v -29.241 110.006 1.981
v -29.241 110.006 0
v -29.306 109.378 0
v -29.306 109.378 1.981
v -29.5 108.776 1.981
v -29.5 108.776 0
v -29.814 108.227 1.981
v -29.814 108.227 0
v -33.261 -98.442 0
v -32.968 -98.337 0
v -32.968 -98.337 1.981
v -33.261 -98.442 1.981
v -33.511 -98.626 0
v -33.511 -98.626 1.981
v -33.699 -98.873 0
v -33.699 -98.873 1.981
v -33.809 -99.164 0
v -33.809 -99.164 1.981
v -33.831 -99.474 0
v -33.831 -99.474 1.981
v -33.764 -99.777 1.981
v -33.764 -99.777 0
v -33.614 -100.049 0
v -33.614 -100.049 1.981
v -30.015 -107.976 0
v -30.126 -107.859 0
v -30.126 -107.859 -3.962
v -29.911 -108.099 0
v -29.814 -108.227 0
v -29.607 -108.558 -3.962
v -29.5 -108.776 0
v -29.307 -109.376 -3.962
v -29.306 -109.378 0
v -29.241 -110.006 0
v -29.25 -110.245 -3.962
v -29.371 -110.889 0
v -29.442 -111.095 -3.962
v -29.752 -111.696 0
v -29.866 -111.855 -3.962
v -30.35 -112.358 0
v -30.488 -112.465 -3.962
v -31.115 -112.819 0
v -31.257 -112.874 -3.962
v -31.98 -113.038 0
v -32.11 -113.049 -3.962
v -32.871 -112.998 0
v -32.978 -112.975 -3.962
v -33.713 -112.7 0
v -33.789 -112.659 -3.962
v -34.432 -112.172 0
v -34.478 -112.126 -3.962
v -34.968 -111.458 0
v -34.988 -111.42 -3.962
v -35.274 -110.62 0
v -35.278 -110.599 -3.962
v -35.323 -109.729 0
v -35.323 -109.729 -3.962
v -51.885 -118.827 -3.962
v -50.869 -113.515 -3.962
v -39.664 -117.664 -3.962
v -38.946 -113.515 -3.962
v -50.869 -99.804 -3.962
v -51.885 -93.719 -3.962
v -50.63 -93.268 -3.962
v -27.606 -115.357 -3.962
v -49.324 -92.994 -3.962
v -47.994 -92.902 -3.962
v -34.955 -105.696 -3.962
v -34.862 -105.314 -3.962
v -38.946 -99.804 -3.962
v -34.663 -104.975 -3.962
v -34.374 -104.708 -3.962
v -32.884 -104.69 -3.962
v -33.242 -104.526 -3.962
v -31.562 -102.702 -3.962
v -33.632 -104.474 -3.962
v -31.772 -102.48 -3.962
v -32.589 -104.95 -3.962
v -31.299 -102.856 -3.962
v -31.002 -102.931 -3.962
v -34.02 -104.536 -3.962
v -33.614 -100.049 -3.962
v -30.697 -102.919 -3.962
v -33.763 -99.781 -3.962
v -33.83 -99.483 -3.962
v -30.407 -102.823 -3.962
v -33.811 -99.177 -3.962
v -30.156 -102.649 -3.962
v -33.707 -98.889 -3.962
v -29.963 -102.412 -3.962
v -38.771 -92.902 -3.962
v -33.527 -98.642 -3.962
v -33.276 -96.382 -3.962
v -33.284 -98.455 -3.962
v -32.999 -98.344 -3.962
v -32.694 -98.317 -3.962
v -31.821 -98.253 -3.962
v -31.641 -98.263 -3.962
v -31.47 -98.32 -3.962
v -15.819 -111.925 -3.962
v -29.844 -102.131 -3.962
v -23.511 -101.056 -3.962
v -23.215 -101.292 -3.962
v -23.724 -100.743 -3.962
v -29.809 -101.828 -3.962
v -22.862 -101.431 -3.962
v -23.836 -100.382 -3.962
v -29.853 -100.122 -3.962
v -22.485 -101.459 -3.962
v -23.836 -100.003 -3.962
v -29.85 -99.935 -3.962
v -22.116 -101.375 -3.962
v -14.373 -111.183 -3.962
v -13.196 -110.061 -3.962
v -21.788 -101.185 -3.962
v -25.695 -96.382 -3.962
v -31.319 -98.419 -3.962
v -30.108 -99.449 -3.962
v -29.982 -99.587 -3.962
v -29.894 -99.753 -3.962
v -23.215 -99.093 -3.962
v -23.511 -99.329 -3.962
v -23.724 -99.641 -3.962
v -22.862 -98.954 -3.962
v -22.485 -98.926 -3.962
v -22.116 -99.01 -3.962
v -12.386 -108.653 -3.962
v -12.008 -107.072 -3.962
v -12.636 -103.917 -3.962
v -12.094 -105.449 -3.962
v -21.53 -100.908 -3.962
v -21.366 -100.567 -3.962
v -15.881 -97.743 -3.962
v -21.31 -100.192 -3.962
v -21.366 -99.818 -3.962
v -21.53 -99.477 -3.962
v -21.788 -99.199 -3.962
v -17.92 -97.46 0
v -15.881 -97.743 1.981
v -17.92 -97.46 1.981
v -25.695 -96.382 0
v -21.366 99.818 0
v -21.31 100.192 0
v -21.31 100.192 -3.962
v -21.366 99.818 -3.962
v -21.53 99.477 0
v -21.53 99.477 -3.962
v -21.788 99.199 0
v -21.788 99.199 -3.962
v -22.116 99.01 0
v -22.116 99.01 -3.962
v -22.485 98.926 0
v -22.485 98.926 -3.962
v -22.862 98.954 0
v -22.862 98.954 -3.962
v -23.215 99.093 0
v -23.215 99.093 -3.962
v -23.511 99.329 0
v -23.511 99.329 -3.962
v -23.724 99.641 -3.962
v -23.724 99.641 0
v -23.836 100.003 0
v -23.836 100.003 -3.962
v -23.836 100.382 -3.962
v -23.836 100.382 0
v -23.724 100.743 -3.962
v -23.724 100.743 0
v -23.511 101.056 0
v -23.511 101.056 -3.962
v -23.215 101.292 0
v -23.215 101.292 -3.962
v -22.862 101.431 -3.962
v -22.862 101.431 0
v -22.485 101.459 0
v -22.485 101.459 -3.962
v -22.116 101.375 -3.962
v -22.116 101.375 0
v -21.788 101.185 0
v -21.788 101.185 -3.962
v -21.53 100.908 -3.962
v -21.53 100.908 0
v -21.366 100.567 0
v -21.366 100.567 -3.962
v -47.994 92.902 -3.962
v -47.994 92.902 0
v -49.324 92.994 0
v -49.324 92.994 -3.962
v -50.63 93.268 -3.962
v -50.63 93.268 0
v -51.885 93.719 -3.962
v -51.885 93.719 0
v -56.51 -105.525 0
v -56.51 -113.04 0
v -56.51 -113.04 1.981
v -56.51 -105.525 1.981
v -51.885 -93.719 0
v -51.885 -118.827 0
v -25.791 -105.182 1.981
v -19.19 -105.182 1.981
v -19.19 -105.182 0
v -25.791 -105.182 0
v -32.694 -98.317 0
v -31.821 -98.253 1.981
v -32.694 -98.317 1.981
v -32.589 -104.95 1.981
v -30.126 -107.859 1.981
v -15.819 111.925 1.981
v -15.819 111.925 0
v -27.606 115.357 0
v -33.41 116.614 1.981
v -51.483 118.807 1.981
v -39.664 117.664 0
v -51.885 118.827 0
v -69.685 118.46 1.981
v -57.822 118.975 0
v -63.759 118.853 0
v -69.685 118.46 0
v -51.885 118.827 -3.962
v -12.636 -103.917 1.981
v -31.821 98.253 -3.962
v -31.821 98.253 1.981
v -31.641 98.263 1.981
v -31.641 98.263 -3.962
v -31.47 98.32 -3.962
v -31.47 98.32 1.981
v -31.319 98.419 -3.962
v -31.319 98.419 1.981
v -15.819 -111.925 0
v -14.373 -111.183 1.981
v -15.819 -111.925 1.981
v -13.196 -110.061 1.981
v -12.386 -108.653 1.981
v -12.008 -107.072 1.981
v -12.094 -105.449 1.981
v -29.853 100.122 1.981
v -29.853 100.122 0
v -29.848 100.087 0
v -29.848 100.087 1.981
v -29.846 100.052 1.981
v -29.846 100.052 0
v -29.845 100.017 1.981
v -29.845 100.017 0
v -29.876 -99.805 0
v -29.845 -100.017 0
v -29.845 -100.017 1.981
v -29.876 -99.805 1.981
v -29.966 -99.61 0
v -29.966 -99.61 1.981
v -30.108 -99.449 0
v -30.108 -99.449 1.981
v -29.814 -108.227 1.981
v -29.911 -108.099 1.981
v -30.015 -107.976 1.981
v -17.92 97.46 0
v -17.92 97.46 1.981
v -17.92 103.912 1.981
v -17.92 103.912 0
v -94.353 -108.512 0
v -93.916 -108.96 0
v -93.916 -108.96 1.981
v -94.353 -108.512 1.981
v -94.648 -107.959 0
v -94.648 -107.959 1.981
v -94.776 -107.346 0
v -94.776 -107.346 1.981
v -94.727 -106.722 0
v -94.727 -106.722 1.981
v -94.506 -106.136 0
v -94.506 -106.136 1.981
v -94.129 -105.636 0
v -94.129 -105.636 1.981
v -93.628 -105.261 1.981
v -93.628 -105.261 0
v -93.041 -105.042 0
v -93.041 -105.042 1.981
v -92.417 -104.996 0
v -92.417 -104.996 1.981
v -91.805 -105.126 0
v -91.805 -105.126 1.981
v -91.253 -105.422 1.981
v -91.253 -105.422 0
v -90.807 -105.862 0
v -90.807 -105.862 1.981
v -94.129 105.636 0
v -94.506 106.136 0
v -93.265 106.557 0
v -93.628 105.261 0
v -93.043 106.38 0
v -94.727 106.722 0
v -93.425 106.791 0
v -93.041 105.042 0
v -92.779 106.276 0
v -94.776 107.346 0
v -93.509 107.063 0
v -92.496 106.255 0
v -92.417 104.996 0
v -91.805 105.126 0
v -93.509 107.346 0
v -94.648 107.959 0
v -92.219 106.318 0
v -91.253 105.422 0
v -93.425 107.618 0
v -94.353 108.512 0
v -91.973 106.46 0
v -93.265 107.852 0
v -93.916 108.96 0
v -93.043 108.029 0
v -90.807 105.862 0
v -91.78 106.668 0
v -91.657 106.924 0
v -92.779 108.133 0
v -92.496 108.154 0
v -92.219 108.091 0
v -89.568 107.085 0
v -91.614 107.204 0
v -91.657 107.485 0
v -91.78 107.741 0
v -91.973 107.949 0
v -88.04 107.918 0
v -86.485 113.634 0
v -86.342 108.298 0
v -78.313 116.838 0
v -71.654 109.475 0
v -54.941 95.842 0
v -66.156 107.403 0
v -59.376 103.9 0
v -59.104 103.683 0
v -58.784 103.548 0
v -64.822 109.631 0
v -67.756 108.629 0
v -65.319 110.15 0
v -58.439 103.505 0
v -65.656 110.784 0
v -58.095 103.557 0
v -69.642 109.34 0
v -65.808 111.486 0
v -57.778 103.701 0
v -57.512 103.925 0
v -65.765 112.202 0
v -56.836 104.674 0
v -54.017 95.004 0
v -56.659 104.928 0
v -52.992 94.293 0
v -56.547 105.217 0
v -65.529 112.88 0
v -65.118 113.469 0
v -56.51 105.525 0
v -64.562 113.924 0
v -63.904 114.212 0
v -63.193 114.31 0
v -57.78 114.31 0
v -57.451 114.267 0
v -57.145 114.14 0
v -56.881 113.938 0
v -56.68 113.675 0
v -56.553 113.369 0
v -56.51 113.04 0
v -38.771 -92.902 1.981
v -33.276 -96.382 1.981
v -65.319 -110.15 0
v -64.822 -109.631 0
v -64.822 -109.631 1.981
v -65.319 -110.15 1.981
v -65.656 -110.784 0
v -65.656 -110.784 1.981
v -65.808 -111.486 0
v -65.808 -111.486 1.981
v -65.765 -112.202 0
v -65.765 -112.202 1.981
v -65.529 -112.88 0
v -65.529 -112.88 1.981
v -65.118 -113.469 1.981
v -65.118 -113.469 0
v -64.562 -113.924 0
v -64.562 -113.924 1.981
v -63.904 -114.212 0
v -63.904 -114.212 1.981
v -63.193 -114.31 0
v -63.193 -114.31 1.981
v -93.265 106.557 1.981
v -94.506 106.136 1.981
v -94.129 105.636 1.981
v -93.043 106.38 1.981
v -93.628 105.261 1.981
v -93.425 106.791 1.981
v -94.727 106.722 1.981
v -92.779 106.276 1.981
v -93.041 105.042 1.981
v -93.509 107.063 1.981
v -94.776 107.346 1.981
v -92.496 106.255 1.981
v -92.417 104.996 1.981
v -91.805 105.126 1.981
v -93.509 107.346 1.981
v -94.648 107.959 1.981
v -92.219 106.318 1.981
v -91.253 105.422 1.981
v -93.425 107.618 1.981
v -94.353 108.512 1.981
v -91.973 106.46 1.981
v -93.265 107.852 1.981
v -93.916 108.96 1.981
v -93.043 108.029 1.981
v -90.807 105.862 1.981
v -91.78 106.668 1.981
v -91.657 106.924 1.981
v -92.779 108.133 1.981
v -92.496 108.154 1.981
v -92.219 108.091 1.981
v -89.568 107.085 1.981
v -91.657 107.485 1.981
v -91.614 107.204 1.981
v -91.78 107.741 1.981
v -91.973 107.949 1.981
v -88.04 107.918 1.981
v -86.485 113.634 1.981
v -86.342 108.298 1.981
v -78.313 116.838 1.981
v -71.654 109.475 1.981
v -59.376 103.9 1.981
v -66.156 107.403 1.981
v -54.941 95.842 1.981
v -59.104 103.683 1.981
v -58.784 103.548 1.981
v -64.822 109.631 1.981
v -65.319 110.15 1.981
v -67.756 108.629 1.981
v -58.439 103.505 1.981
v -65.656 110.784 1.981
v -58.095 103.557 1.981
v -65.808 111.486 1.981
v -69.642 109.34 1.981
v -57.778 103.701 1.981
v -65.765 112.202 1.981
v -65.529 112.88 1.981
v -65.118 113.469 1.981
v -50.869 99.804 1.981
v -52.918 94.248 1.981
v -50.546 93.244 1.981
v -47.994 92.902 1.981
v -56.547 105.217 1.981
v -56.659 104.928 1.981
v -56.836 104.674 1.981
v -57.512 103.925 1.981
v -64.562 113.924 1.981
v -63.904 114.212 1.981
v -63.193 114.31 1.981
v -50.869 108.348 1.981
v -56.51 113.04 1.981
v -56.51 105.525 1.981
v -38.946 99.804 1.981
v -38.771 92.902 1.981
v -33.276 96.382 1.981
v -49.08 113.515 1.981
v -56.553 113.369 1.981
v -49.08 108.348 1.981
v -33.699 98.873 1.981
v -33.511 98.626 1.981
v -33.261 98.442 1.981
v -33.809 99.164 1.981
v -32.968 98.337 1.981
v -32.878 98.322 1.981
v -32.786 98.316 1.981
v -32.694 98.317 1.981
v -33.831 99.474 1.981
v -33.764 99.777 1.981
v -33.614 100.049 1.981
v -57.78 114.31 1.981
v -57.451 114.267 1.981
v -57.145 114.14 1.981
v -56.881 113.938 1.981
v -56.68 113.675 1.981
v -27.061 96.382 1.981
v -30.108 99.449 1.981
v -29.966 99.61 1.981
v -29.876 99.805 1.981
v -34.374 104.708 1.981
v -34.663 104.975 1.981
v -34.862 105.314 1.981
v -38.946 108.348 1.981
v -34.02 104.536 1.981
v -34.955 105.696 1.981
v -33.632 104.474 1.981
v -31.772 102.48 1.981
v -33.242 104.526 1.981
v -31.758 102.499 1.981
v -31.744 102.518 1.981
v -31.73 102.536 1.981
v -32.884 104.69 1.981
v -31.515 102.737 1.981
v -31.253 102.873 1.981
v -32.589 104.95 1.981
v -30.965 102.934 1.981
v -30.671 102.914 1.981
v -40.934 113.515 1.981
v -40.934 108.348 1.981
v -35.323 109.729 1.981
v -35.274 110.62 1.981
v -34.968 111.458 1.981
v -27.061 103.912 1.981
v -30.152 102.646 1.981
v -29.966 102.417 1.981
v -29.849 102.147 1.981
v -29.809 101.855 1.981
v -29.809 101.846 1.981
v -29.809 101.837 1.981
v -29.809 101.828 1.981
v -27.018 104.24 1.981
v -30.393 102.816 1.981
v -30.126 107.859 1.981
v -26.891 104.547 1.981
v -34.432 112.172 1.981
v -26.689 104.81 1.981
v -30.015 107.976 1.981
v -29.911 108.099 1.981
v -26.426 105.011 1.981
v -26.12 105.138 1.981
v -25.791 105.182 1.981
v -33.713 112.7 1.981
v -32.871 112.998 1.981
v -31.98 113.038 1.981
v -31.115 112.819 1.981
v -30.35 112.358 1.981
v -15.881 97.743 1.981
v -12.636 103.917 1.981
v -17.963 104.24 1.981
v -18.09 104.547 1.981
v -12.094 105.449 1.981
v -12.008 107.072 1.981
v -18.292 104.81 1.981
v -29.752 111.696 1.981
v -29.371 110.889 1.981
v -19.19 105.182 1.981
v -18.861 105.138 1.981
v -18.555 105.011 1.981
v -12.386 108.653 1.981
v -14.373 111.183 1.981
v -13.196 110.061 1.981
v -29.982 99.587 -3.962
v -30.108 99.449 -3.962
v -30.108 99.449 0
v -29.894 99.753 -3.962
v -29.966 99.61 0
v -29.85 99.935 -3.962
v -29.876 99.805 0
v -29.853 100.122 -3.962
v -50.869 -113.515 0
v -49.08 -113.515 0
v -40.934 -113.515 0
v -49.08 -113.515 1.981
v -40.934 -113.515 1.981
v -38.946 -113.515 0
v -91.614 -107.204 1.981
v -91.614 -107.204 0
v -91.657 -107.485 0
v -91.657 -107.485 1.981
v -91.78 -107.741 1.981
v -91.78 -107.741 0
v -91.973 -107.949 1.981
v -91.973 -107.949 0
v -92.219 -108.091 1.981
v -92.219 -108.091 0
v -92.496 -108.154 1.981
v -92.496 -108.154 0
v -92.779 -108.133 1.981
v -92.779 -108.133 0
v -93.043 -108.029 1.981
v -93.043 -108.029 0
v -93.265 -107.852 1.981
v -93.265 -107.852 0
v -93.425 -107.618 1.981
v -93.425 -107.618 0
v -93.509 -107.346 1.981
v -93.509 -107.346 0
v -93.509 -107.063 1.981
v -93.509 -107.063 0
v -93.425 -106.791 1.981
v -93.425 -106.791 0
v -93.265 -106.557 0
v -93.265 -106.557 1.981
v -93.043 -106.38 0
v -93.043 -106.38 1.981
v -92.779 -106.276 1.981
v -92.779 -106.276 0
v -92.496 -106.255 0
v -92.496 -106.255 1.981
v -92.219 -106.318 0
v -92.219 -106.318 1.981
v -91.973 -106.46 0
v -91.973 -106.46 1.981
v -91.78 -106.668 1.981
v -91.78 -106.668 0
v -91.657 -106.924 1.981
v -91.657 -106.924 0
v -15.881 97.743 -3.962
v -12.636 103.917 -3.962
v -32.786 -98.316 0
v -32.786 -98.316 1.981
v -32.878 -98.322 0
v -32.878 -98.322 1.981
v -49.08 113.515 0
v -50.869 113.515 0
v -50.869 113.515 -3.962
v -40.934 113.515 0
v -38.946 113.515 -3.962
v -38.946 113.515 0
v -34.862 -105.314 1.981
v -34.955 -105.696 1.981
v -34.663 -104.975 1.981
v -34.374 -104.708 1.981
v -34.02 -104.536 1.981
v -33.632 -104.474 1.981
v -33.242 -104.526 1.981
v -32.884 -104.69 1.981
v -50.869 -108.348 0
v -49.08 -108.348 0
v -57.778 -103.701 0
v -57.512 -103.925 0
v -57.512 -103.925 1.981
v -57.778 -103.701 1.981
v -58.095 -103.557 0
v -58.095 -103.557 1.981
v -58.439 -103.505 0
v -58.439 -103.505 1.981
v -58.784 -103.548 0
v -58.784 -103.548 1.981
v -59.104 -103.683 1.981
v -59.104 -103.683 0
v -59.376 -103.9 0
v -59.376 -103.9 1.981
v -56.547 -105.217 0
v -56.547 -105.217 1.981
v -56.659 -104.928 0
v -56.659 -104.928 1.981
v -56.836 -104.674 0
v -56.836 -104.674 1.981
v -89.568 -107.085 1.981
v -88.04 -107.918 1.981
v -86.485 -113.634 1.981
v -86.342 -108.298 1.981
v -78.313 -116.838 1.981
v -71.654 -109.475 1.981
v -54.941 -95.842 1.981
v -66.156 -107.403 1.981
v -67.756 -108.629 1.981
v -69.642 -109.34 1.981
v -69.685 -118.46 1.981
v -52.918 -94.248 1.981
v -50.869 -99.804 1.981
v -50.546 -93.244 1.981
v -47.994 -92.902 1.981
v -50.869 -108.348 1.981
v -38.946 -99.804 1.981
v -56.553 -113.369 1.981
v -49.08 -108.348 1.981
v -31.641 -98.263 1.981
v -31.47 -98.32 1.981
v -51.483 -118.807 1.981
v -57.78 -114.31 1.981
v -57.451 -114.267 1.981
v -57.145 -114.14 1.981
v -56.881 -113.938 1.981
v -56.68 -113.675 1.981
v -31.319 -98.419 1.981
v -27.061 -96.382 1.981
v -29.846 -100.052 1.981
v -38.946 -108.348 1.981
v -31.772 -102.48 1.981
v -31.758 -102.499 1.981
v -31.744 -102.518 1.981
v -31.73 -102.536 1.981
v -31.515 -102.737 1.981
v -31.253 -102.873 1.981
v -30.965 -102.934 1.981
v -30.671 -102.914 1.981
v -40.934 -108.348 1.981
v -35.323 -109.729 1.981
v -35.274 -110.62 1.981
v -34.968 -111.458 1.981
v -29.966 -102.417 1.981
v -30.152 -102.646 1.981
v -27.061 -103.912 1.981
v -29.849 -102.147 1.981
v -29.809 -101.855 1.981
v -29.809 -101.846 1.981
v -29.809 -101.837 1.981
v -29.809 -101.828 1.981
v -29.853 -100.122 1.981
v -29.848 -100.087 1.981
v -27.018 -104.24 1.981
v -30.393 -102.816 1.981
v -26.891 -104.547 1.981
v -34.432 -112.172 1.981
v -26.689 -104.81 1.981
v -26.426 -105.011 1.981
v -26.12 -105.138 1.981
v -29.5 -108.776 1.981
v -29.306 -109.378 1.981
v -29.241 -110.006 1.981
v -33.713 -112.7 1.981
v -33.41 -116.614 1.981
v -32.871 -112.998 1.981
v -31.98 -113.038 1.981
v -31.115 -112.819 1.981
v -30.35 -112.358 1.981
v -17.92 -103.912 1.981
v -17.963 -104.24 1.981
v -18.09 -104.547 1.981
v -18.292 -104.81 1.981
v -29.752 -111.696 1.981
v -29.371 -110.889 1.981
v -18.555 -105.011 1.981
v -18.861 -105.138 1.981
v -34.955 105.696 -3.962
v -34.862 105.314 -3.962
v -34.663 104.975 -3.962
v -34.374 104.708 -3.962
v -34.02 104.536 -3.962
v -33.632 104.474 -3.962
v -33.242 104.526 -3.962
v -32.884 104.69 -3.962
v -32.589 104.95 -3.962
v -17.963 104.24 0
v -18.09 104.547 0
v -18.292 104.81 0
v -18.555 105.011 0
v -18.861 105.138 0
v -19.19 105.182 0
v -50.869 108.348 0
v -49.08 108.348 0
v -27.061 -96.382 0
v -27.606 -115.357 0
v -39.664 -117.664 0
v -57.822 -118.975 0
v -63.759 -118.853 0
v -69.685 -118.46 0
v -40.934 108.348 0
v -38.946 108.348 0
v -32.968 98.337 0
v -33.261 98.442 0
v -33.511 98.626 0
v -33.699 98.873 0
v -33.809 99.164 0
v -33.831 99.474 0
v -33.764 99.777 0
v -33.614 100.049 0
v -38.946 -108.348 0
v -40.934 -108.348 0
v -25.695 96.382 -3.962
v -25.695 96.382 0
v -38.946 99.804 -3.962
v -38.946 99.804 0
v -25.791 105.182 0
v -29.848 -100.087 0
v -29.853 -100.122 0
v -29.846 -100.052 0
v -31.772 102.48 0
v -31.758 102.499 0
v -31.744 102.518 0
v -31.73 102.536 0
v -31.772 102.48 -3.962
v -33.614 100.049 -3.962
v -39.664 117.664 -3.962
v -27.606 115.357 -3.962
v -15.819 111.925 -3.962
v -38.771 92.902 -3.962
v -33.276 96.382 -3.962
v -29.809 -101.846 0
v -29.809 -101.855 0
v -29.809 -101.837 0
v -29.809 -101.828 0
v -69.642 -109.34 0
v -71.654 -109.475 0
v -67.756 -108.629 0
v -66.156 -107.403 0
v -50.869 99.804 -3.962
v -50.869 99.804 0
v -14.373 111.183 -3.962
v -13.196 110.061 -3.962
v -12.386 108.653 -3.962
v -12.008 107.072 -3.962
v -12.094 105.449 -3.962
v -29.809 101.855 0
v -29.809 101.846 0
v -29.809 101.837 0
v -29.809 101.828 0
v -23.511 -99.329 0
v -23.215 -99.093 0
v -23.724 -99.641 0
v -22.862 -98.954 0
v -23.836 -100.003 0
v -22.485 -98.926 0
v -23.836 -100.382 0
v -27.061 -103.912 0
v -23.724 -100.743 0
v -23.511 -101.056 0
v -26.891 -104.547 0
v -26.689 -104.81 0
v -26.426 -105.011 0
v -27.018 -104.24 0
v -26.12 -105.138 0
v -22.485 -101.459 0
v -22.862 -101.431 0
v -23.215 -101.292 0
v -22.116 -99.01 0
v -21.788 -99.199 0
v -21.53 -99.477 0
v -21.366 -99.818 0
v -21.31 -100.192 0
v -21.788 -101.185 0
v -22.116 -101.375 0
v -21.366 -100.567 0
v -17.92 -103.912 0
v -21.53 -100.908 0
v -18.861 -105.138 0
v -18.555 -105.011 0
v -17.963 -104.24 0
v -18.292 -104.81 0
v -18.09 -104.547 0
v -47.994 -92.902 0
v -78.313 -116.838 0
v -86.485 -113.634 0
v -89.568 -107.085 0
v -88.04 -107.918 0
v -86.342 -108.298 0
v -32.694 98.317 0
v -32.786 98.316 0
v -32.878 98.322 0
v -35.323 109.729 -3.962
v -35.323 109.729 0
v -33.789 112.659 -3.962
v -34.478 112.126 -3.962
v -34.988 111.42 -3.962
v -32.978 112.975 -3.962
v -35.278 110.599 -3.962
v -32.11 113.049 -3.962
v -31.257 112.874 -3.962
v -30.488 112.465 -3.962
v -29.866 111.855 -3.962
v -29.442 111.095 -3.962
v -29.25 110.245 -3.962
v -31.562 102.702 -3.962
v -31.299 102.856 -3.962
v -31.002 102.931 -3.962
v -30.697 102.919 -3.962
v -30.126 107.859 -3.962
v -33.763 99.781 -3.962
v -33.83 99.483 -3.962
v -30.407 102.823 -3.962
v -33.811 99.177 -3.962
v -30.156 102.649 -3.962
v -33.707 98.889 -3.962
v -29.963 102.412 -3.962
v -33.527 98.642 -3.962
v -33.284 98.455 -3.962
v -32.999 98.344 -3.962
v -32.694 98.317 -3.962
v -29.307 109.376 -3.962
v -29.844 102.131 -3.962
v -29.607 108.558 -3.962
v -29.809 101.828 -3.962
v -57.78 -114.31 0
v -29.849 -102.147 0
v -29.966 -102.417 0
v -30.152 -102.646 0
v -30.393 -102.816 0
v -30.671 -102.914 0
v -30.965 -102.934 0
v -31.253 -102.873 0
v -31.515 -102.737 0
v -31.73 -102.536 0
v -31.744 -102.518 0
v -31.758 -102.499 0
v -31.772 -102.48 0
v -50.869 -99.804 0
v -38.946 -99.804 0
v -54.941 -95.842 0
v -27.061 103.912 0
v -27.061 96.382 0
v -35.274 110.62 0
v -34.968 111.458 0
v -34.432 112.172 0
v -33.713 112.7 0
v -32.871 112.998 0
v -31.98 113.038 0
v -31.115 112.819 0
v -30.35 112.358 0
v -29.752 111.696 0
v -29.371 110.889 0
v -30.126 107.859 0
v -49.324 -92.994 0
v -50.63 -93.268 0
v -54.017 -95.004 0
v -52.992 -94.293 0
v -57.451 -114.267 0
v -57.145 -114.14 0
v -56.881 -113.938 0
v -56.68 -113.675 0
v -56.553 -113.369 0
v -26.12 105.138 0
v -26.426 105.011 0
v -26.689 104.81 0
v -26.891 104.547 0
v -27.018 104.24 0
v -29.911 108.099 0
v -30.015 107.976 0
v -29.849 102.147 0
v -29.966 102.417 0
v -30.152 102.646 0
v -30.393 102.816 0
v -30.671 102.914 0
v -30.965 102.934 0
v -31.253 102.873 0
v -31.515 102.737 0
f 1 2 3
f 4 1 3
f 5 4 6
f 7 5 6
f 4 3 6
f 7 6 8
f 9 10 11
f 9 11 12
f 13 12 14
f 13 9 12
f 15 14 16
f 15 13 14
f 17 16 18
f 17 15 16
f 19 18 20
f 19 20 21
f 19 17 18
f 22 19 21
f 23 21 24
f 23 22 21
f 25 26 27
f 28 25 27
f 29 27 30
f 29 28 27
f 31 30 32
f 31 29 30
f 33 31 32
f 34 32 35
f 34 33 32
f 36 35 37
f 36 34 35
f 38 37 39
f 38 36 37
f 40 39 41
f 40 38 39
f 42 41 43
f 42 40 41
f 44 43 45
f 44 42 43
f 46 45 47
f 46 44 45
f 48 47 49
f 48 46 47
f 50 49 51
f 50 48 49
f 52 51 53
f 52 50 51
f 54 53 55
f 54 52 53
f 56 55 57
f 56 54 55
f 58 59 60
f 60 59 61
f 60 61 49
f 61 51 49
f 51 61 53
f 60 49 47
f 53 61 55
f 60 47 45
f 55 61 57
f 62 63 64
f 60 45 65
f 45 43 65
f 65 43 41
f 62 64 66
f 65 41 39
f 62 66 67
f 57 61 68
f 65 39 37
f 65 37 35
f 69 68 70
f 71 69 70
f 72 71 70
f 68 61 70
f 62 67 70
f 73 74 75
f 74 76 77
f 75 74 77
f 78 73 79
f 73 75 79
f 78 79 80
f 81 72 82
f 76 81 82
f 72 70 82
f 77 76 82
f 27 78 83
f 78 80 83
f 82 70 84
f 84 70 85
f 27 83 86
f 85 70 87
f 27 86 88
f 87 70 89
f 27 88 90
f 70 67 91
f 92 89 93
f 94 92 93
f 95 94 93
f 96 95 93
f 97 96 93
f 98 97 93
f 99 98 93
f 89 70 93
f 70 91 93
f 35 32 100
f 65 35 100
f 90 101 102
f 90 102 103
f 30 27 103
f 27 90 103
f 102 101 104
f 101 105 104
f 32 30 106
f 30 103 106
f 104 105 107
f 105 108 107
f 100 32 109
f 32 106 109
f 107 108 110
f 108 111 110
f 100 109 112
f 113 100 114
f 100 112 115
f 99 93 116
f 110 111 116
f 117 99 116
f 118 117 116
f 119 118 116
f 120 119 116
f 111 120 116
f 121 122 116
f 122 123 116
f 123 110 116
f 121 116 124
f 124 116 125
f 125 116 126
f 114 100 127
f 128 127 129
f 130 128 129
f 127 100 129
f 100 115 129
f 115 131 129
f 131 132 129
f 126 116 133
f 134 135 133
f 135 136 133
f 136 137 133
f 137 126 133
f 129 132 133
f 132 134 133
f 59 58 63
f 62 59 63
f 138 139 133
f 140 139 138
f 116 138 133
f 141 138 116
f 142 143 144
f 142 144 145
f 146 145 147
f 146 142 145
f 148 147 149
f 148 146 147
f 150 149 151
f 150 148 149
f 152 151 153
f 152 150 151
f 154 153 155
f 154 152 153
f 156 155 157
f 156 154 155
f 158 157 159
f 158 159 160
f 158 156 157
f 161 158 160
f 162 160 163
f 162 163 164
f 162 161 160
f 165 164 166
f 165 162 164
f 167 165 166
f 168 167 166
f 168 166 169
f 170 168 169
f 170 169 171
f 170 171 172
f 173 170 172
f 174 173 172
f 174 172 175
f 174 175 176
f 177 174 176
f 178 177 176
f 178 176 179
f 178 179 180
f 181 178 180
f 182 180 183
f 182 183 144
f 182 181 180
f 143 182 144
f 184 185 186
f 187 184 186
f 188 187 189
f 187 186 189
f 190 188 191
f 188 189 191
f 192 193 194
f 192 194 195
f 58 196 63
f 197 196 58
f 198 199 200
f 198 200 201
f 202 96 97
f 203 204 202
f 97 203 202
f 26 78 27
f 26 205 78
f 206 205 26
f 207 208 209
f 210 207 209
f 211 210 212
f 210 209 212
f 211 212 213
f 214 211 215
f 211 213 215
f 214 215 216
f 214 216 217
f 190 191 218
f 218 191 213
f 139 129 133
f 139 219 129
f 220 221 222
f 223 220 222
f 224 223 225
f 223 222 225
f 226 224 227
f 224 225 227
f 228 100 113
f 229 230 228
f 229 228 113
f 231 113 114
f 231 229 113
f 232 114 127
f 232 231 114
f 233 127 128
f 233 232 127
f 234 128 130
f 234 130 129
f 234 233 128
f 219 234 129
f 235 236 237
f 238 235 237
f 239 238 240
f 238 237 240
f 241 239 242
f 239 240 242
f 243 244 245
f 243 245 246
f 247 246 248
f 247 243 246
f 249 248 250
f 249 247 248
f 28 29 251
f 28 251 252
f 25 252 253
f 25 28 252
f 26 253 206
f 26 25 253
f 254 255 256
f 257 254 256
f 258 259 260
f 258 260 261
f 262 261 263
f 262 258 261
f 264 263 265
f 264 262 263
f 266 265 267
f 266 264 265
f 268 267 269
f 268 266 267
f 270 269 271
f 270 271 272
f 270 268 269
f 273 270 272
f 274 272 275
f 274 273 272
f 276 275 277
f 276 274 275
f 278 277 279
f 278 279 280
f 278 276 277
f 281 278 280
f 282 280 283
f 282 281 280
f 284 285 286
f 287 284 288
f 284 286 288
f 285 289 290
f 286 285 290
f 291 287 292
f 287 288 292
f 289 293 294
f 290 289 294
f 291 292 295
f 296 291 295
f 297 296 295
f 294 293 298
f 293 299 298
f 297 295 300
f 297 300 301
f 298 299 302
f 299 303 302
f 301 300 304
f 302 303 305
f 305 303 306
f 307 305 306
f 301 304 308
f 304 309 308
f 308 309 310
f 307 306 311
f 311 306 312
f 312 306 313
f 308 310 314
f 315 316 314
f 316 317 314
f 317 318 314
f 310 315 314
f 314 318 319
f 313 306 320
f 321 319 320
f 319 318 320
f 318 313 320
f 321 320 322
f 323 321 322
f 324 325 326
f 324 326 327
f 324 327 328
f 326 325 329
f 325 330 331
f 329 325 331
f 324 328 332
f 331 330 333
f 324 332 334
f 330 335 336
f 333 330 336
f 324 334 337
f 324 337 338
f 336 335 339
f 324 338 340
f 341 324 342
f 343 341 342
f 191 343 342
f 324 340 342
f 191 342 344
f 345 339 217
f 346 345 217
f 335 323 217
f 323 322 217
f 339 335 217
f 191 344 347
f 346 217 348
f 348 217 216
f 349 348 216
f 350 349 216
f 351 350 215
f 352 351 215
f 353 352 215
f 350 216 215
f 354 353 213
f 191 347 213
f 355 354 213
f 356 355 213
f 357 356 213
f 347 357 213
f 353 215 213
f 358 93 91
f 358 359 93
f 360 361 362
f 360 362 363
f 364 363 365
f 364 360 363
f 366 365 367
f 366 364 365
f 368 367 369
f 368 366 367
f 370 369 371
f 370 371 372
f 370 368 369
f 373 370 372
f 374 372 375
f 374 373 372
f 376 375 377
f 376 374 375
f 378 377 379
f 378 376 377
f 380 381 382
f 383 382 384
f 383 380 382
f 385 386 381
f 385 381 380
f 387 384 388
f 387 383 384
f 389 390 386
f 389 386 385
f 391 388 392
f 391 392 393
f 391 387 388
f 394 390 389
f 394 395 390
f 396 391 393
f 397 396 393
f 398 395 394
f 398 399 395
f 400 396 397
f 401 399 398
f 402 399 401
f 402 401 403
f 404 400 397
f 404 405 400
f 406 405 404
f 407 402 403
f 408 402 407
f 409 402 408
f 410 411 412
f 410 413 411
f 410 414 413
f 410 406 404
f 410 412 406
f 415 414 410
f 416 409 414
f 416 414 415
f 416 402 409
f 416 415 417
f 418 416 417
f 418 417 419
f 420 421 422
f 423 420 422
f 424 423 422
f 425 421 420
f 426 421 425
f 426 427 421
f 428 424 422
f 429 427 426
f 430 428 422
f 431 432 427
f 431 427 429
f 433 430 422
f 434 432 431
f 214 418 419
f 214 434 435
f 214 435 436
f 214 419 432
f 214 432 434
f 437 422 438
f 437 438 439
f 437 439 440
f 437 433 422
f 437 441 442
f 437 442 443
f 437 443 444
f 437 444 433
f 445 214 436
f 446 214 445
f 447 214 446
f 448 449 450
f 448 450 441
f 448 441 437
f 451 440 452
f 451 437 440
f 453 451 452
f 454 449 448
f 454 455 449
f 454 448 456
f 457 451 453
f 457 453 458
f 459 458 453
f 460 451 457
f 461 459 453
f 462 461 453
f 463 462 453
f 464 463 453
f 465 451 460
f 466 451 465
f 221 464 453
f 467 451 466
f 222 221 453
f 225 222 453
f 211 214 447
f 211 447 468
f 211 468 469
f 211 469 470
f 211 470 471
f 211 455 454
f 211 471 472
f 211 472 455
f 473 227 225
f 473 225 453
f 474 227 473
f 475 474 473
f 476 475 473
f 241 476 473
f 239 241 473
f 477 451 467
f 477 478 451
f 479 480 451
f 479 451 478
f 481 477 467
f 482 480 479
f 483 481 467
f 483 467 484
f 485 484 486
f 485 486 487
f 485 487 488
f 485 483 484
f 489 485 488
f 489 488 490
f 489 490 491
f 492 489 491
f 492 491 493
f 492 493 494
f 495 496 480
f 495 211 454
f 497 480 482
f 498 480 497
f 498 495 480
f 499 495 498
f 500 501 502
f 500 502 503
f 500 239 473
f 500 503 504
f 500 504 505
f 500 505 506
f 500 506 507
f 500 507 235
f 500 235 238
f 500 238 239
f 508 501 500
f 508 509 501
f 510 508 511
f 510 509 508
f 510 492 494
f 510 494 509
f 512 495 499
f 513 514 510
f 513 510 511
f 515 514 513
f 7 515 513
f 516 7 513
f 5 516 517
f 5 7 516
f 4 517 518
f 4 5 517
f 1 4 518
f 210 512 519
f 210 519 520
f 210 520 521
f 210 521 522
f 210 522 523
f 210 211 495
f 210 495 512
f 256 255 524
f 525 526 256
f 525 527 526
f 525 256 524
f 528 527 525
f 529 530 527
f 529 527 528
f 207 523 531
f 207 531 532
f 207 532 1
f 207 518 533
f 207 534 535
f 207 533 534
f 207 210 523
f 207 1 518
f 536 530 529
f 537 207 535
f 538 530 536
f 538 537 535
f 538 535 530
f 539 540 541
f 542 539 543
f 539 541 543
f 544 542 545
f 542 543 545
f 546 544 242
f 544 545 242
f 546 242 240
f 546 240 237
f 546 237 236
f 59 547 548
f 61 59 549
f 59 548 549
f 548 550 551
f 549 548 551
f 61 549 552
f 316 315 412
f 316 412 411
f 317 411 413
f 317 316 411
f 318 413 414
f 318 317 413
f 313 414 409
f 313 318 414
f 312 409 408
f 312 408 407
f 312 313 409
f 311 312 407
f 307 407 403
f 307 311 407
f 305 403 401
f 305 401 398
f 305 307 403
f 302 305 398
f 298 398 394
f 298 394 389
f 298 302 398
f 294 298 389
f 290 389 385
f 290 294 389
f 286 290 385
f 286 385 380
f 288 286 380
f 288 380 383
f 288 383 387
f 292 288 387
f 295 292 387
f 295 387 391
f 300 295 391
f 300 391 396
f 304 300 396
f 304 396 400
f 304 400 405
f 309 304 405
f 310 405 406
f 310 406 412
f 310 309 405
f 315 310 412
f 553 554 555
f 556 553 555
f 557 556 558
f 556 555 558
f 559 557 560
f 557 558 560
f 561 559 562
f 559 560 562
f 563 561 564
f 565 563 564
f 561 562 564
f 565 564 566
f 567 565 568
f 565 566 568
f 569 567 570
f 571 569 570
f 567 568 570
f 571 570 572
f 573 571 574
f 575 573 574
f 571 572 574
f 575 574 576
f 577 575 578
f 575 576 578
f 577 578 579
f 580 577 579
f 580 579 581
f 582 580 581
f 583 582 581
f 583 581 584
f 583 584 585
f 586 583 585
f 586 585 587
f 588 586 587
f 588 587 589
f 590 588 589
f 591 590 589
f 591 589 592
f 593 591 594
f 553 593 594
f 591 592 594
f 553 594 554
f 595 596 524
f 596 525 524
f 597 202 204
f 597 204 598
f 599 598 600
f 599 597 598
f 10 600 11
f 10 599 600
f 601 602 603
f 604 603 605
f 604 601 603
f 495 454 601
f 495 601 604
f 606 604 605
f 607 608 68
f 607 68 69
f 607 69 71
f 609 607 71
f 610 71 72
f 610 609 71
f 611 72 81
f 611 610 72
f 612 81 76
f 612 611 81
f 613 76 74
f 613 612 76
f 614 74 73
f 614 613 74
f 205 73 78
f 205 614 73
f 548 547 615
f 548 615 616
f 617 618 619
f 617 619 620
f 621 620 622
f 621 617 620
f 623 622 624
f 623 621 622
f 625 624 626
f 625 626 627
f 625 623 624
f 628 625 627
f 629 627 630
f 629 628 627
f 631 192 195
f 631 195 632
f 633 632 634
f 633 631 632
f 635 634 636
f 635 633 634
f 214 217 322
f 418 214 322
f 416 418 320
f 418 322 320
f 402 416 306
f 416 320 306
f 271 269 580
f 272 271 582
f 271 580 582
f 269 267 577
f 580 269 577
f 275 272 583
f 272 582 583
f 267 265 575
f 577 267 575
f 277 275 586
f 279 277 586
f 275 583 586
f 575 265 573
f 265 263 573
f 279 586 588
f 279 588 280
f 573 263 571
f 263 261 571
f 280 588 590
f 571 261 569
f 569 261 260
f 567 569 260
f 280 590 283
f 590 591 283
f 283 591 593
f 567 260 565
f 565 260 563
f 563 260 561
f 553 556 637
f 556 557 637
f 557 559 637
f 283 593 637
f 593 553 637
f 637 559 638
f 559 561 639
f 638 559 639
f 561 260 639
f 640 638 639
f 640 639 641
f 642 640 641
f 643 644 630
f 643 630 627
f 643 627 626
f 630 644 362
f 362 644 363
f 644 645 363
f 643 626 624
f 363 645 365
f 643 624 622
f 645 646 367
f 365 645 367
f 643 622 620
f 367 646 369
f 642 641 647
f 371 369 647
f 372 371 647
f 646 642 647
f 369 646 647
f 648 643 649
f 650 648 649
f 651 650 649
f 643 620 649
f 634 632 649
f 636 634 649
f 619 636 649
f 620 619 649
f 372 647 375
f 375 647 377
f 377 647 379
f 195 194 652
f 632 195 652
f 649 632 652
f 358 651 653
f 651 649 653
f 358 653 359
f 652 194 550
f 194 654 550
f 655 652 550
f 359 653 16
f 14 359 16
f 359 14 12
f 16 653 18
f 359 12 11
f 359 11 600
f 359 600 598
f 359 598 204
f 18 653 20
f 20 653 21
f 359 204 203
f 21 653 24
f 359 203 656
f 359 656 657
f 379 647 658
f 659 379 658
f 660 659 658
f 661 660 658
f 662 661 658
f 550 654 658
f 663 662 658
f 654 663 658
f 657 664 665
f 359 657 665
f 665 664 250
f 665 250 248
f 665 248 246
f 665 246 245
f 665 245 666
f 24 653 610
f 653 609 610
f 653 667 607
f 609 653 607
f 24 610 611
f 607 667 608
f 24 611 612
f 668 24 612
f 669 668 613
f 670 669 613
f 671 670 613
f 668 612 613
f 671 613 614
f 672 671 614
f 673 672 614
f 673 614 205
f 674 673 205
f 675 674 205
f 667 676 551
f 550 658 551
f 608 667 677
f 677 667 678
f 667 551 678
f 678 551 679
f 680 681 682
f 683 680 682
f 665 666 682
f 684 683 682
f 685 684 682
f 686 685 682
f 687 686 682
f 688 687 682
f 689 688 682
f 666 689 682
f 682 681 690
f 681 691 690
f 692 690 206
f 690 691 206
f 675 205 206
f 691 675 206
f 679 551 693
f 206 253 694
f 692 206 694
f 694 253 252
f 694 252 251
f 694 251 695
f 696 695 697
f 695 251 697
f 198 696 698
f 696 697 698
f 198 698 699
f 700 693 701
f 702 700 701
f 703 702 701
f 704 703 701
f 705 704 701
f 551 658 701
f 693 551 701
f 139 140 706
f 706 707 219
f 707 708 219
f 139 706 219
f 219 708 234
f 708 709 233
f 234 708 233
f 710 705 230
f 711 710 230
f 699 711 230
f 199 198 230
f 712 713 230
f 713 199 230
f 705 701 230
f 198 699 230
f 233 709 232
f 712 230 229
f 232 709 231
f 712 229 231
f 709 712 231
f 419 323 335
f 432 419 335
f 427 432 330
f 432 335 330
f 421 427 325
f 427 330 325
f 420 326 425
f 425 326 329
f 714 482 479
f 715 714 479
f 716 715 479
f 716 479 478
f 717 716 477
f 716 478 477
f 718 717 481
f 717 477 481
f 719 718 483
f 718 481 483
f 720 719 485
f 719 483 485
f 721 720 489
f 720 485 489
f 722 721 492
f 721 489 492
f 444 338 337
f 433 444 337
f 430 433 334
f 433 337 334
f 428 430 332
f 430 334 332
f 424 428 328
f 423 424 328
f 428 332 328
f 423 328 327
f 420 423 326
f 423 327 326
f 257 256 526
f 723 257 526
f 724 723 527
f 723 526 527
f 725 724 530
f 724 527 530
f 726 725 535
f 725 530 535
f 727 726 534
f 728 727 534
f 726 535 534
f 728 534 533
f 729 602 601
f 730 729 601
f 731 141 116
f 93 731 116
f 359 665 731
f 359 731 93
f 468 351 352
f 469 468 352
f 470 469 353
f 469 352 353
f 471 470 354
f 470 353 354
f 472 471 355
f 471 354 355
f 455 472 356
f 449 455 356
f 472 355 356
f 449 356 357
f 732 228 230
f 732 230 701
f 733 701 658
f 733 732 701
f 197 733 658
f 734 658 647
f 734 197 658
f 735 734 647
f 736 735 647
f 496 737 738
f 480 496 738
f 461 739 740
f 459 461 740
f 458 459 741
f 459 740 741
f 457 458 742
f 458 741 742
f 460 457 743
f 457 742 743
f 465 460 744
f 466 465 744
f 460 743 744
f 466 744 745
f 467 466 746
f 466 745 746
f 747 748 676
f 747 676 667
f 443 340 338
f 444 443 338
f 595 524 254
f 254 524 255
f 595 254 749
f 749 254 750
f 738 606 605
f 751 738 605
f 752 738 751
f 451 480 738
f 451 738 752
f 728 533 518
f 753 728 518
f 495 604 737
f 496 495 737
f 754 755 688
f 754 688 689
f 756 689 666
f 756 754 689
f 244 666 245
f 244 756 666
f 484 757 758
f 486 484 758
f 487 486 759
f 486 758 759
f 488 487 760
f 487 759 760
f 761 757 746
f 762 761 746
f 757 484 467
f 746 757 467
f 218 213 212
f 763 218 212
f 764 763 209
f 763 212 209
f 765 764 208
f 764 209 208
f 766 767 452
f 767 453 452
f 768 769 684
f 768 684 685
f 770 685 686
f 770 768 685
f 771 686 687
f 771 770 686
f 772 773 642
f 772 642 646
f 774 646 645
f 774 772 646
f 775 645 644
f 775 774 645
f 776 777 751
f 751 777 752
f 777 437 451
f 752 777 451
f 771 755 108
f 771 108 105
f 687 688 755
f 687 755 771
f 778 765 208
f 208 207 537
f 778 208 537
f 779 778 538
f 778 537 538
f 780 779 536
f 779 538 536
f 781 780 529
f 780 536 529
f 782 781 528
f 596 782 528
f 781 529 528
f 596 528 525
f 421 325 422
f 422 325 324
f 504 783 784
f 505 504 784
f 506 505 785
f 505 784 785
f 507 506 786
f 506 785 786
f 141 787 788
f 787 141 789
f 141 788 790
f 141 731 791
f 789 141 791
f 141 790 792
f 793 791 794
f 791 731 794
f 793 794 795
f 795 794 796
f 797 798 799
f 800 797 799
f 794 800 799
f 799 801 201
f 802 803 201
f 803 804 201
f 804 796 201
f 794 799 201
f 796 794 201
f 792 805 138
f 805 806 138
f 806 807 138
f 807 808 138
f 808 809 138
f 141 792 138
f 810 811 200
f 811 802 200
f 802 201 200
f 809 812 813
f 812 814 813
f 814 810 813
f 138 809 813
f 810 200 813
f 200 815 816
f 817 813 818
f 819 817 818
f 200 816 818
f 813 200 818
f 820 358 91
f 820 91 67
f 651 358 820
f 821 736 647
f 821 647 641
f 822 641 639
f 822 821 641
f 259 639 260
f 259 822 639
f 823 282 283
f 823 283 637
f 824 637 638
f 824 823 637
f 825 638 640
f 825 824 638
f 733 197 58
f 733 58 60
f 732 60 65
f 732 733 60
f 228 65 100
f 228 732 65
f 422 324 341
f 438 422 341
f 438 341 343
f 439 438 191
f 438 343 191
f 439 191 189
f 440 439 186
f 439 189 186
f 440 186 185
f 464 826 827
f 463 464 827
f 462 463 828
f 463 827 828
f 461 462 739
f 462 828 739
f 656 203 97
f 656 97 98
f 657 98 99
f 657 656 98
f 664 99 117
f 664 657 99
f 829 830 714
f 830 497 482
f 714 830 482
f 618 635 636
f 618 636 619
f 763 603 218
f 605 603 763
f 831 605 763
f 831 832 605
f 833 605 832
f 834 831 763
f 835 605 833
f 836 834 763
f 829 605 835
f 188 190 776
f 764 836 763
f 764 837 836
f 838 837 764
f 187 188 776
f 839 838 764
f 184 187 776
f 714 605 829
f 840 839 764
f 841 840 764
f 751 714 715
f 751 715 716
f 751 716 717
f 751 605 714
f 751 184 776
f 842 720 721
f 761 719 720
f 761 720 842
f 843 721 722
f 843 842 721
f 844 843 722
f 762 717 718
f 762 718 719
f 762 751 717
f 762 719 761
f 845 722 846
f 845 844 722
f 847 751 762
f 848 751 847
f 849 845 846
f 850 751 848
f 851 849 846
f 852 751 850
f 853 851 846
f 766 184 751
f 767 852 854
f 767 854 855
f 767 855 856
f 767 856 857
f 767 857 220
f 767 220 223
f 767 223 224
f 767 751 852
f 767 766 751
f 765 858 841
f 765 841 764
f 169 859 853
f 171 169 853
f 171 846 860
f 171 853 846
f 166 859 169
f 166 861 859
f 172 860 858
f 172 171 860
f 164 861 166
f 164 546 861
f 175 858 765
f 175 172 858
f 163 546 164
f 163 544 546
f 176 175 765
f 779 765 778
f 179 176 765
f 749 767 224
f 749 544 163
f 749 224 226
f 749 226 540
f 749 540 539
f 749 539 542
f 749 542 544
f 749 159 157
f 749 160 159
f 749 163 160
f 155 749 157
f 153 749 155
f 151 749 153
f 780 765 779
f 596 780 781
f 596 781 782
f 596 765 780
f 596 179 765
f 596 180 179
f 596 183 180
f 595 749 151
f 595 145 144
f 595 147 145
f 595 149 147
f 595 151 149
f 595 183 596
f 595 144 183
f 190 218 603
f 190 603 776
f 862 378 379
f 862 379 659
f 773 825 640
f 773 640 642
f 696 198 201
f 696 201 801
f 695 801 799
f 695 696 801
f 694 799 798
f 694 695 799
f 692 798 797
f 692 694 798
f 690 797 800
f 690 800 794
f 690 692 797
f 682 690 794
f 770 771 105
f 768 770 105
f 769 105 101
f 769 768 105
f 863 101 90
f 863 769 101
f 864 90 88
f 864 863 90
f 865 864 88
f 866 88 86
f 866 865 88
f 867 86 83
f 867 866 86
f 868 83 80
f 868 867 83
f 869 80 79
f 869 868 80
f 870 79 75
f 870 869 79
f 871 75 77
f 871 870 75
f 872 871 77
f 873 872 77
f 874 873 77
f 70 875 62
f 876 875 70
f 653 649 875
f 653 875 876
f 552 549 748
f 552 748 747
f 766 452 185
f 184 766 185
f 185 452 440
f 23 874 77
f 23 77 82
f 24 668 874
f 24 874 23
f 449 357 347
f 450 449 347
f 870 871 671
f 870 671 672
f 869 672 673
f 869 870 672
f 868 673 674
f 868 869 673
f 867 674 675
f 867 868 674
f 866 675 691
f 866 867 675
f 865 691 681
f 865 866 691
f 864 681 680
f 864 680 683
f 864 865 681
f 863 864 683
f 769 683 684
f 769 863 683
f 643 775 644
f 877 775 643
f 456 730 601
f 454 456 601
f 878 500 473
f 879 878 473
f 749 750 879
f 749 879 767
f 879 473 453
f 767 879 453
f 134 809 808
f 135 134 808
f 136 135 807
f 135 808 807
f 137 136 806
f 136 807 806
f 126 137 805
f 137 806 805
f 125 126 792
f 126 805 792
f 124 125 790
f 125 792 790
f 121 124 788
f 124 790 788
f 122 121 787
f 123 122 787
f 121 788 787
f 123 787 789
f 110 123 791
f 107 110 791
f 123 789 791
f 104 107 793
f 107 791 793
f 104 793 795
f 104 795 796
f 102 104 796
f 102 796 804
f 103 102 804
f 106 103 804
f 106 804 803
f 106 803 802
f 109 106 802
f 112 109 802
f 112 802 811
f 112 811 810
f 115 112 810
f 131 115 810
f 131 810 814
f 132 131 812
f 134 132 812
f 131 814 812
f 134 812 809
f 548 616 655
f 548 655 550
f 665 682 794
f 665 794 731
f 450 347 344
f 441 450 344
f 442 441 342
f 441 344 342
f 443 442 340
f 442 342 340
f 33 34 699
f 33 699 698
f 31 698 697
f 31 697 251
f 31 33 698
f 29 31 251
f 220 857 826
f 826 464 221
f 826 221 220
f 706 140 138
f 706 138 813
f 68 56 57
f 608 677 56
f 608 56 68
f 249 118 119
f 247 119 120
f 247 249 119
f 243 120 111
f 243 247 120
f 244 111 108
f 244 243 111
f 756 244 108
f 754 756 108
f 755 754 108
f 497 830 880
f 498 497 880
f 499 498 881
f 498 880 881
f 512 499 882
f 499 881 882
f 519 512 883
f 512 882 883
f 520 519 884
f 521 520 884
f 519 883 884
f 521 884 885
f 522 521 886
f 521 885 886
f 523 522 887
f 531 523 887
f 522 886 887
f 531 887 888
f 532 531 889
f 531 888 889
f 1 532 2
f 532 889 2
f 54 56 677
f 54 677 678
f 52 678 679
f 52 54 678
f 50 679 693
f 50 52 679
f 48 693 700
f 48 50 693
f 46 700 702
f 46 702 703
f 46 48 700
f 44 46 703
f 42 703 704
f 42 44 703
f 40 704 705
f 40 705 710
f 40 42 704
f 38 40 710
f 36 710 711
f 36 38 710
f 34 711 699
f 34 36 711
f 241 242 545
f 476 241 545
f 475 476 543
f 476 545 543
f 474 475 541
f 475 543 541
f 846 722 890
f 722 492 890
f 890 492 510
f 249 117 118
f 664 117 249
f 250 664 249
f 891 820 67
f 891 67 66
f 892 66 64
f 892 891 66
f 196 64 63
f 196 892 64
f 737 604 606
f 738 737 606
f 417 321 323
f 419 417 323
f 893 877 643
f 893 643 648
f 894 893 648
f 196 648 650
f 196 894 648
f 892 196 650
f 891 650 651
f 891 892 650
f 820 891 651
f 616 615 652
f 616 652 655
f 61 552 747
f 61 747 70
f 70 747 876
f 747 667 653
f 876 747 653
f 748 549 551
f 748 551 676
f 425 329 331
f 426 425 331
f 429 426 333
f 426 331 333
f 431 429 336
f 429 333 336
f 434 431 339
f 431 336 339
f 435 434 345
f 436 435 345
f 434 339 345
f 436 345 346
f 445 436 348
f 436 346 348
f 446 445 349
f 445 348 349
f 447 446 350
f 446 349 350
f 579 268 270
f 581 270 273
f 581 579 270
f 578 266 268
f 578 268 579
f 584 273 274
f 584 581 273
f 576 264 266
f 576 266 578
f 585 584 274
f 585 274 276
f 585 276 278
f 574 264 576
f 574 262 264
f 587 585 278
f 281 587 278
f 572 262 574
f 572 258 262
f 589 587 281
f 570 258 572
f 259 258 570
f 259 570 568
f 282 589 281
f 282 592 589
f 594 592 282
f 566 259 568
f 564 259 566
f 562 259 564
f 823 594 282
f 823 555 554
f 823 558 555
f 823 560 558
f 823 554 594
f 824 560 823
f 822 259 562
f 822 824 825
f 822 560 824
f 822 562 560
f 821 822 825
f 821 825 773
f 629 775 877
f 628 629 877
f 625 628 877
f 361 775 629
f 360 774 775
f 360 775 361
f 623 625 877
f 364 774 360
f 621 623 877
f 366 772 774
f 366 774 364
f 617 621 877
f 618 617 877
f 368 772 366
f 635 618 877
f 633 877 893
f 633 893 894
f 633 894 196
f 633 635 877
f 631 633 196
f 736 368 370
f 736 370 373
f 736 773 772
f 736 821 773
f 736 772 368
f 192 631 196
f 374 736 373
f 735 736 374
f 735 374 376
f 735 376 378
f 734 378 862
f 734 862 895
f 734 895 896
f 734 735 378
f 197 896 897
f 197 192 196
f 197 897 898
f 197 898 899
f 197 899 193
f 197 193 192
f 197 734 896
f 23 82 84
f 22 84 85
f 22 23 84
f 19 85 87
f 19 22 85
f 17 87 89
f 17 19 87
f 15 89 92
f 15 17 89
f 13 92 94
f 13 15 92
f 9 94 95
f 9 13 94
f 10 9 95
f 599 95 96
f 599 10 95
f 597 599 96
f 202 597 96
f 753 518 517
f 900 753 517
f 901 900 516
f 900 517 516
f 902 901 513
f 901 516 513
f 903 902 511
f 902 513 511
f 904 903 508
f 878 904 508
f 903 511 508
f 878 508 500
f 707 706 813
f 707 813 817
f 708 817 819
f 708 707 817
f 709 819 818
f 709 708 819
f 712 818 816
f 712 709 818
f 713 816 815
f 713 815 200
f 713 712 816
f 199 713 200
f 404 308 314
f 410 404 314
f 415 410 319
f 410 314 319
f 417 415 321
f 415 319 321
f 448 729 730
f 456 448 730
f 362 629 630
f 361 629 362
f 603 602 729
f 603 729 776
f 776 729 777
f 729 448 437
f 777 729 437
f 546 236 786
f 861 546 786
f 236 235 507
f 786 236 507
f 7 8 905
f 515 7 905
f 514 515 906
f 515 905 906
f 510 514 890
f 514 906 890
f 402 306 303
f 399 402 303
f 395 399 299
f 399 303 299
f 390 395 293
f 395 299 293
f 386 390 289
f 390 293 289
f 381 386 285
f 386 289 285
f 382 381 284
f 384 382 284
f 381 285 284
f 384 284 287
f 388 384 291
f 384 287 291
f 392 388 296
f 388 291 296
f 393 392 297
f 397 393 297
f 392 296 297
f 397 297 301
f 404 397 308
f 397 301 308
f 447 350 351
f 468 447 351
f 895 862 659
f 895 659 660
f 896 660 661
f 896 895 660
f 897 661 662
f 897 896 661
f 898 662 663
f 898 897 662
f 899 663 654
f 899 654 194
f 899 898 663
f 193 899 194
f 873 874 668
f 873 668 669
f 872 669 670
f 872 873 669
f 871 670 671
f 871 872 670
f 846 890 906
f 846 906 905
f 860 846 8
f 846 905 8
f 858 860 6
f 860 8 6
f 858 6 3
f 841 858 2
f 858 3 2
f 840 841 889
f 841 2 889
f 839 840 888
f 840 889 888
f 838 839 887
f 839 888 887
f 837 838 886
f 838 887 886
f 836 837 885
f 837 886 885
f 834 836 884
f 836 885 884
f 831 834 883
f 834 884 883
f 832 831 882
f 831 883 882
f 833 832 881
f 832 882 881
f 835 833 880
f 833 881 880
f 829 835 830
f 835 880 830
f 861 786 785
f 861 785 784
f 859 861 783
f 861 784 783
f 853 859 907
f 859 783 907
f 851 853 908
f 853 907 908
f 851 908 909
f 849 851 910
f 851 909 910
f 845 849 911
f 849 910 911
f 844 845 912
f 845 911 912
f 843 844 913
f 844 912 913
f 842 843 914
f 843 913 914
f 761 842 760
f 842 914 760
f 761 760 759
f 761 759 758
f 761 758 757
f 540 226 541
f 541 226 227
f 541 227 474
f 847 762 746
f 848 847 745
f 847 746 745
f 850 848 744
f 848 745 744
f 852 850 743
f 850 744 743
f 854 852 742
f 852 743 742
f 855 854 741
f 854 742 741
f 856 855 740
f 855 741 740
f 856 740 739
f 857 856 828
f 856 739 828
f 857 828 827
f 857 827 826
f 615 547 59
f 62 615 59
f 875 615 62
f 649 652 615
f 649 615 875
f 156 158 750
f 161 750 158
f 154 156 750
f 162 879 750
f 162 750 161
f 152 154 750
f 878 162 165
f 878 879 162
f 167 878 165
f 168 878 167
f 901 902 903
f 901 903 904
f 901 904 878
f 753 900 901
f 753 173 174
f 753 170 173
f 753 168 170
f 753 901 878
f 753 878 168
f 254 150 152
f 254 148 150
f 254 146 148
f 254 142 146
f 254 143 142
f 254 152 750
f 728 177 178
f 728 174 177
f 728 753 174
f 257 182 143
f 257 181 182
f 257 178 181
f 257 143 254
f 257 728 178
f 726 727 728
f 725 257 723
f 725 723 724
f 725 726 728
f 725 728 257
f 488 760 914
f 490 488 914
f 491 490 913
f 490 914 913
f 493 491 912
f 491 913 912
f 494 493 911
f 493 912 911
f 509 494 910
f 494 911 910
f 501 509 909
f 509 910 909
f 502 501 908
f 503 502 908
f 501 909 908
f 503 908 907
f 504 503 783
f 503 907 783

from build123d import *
from build123d import SkipClean  # not in build123d's __all__

# Parameters (mm, degrees)
F0_R     = 1.27
F0_R_2   = 0.9525
F1_DEPTH = 1.9812
F2_W     = 11.9223818183
F2_H     = 13.7107372284
F2_R     = 1.27
F3_DEPTH = 3.9624
F5_DEPTH = 1.9812


# Not quite as in the source:
# - after a boolean that leaves OpenCascade's solid faulty, fix() repairs it


with BuildPart() as f1:
    # F0 (on Top) → F1 (new body)
    with BuildSketch(Plane.XY):
        with BuildLine():
            Line((-47.9935594662, 92.9018468329), (-38.7711464414, 92.9018468329))
            Line((-38.7711464414, 92.9018468329), (-33.2755186414, 96.3824086013))
            Line((-33.2755186414, 96.3824086013), (-25.6948654508, 96.3824086013))
            Line((-25.6948654508, 96.3824086013), (-15.8810783178, 97.7427214384))
            Line((-15.8810783178, 97.7427214384), (-12.636416007, 103.9167105482))
            ThreePointArc((-12.636416007, 103.9167105482), (-12.3860869147, 108.6525727702), (-15.8187403188, 111.9248726108))
            ThreePointArc((-15.8187403188, 111.9248726108), (-42.408191436, 118.0267426348), (-69.6853622794, 118.4599623084))
            ThreePointArc((-69.6853622794, 118.4599623084), (-82.4742788904, 115.4278151789), (-93.9159779713, 108.9595985437))
            ThreePointArc((-93.9159779713, 108.9595985437), (-94.1293035133, 105.6362591622), (-90.8067524433, 105.8615297079))
            ThreePointArc((-90.8067524433, 105.8615297079), (-88.8335264193, 107.5549552633), (-86.3416423602, 108.2978044339))
            Line((-86.3416423602, 108.2978044339), (-71.653987872, 109.474757484))
            ThreePointArc((-71.653987872, 109.474757484), (-68.6729520146, 109.0541017361), (-66.1555117331, 107.4030352715))
            Line((-66.1555117331, 107.4030352715), (-54.9410246313, 95.841743052))
            ThreePointArc((-54.9410246313, 95.841743052), (-51.7655039912, 93.6670703781), (-47.9935594662, 92.9018468329))
        make_face()
        with BuildLine():
            ThreePointArc((-31.729853951, 102.5358076193), (-30.5288188939, 102.8743550973), (-29.8086822236, 101.8552855317))
            ThreePointArc((-29.8086822236, 101.8552855317), (-29.8087704345, 101.8414752371), (-29.8090350527, 101.8276671962))
            Line((-29.8090350527, 101.8276671962), (-29.852613442, 100.1223570045))
            ThreePointArc((-29.852613442, 100.1223570045), (-29.8470387538, 100.0699346624), (-29.8451774306, 100.0172496117))
            ThreePointArc((-29.8451774306, 100.0172496117), (-29.9140658389, 99.7040195755), (-30.1080177856, 99.4485957889))
            Line((-30.1080177856, 99.4485957889), (-31.318617745, 98.418811003))
            ThreePointArc((-31.318617745, 98.418811003), (-31.5535333525, 98.285914355), (-31.821401526, 98.2528461926))
            Line((-31.821401526, 98.2528461926), (-32.6937066692, 98.3167908194))
            ThreePointArc((-32.6937066692, 98.3167908194), (-32.8317059691, 98.3180750151), (-32.9684173403, 98.336928579))
            ThreePointArc((-32.9684173403, 98.336928579), (-33.7642168357, 99.014754834), (-33.6142944517, 100.0492926766))
            Line((-33.6142944517, 100.0492926766), (-31.7720925497, 102.4800738847))
            ThreePointArc((-31.7720925497, 102.4800738847), (-31.751424005, 102.5082823627), (-31.729853951, 102.5358076193))
        make_face(mode=Mode.SUBTRACT)
        with Locations((-22.5797742605, 100.1924086013)):
            Circle(F0_R, mode=Mode.SUBTRACT)
        with Locations((-92.566716894, 107.2044729315)):
            Circle(F0_R_2, mode=Mode.SUBTRACT)
        with BuildLine():
            ThreePointArc((-57.7795208585, 114.3099591136), (-56.8814952464, 113.9379847257), (-56.5095208585, 113.0399591136))
            Line((-56.5095208585, 113.0399591136), (-56.5095208585, 105.5245197072))
            ThreePointArc((-56.5095208585, 105.5245197072), (-56.5940696416, 105.0688823379), (-56.8364585157, 104.6739120317))
            Line((-56.8364585157, 104.6739120317), (-57.5123382575, 103.924569237))
            ThreePointArc((-57.5123382575, 103.924569237), (-58.4388736983, 103.5052844519), (-59.3760069692, 103.9003146871))
            Line((-59.3760069692, 103.9003146871), (-64.8223236203, 109.6314042807))
            ThreePointArc((-64.8223236203, 109.6314042807), (-65.6702235375, 112.5495796966), (-63.193179667, 114.3099591136))
            Line((-63.193179667, 114.3099591136), (-57.7795208585, 114.3099591136))
        make_face(mode=Mode.SUBTRACT)
        Polygon((-40.933508426, 108.3481609821), (-38.946442306, 108.3481609821), (-38.946442306, 99.8037904501), (-50.8688241243, 99.8037904501), (-50.8688241243, 108.3481609821), (-49.0804649889, 108.3481609821), (-49.0804649889, 113.5145276785), (-40.933508426, 113.5145276785), align=None, mode=Mode.SUBTRACT)
        with BuildLine():
            ThreePointArc((-35.3233501937, 109.7291281762), (-32.4270965422, 113.0506303681), (-29.2408396166, 110.0062209297))
            ThreePointArc((-29.2408396166, 110.0062209297), (-29.3876130121, 109.0718435745), (-29.8137957369, 108.2274670254))
            ThreePointArc((-29.8137957369, 108.2274670254), (-29.9624421423, 108.0370704325), (-30.1257006344, 107.8590443638))
            Line((-30.1257006344, 107.8590443638), (-32.5888625406, 104.9495528088))
            ThreePointArc((-32.5888625406, 104.9495528088), (-34.0204329464, 104.5359221908), (-34.9551612301, 105.6964251639))
            Line((-34.9551612301, 105.6964251639), (-35.3233501937, 109.7291281762))
        make_face(mode=Mode.SUBTRACT)
    extrude(amount=F1_DEPTH)

    # F2 (on face) → F3 (join)
    with BuildSketch(Plane(origin=(0, 0, 0), x_dir=(1, 0, 0), z_dir=(0, 0, -1))):
        with BuildLine():
            ThreePointArc((-15.8187403188, -111.9248726108), (-12.3860869147, -108.6525727702), (-12.636416007, -103.9167105482))
            Line((-12.636416007, -103.9167105482), (-15.8810783178, -97.7427214384))
            Line((-15.8810783178, -97.7427214384), (-25.6948654508, -96.3824086013))
            Line((-25.6948654508, -96.3824086013), (-33.2755186414, -96.3824086013))
            Line((-33.2755186414, -96.3824086013), (-38.7711464414, -92.9018468329))
            Line((-38.7711464414, -92.9018468329), (-47.9935594662, -92.9018468329))
            ThreePointArc((-47.9935594662, -92.9018468329), (-49.9815784423, -93.1082123487), (-51.8848241243, -93.7185090381))
            Line((-51.8848241243, -93.7185090381), (-51.8848241243, -118.8269193207))
            ThreePointArc((-51.8848241243, -118.8269193207), (-33.6074883899, -116.652433517), (-15.8187403188, -111.9248726108))
        make_face()
        with Locations((-44.9076332152, -106.6591590643)):
            Rectangle(F2_W, F2_H, mode=Mode.SUBTRACT)
        with BuildLine():
            Line((-32.5888625406, -104.9495528088), (-30.1257006344, -107.8590443638))
            ThreePointArc((-30.1257006344, -107.8590443638), (-31.2566588837, -112.873826319), (-35.3233501937, -109.7291281762))
            Line((-35.3233501937, -109.7291281762), (-34.9551612301, -105.6964251639))
            ThreePointArc((-34.9551612301, -105.6964251639), (-34.0204329464, -104.5359221908), (-32.5888625406, -104.9495528088))
        make_face(mode=Mode.SUBTRACT)
        with BuildLine():
            ThreePointArc((-29.8090350527, -101.8276671962), (-30.5488332951, -102.8812249507), (-31.7720925497, -102.4800738847))
            Line((-31.7720925497, -102.4800738847), (-33.6142944517, -100.0492926766))
            ThreePointArc((-33.6142944517, -100.0492926766), (-33.7073705562, -98.8890012798), (-32.6937066692, -98.3167908194))
            Line((-32.6937066692, -98.3167908194), (-31.821401526, -98.2528461926))
            ThreePointArc((-31.821401526, -98.2528461926), (-31.5535333525, -98.285914355), (-31.318617745, -98.418811003))
            Line((-31.318617745, -98.418811003), (-30.1080177856, -99.4485957889))
            ThreePointArc((-30.1080177856, -99.4485957889), (-29.8936506369, -99.7526240879), (-29.852613442, -100.1223570045))
            Line((-29.852613442, -100.1223570045), (-29.8090350527, -101.8276671962))
        make_face(mode=Mode.SUBTRACT)
        with Locations((-22.5797742605, -100.1924086013)):
            Circle(F2_R, mode=Mode.SUBTRACT)
    with SkipClean():  # cleaning this boolean's faces spoils the solid; the shape is the same uncleaned
        extrude(amount=F3_DEPTH)

    # F4 (on face) → F5 (cut)
    with BuildSketch(Plane.XY.offset(1.9812)):
        with BuildLine():
            Line((-27.0608905703, 103.9116269755), (-27.0608905703, 96.3824086013))
            Line((-27.0608905703, 96.3824086013), (-25.6948654508, 96.3824086013))
            Line((-25.6948654508, 96.3824086013), (-17.9199781269, 97.4601045907))
            Line((-17.9199781269, 97.4601045907), (-17.9199781269, 103.9116269755))
            ThreePointArc((-17.9199781269, 103.9116269755), (-18.2919525148, 104.8096525876), (-19.1899781269, 105.1816269755))
            Line((-19.1899781269, 105.1816269755), (-25.7908905703, 105.1816269755))
            ThreePointArc((-25.7908905703, 105.1816269755), (-26.6889161824, 104.8096525876), (-27.0608905703, 103.9116269755))
        make_face()
    extrude(amount=-F5_DEPTH, mode=Mode.SUBTRACT)

    add(f1.part.fix(), mode=Mode.REPLACE)


with BuildPart() as f6_1:
    # F6: instance of F1
    add(f1.part.mirror(Plane.XZ), clean=False)


solid = Compound([f1.part, f6_1.part])
